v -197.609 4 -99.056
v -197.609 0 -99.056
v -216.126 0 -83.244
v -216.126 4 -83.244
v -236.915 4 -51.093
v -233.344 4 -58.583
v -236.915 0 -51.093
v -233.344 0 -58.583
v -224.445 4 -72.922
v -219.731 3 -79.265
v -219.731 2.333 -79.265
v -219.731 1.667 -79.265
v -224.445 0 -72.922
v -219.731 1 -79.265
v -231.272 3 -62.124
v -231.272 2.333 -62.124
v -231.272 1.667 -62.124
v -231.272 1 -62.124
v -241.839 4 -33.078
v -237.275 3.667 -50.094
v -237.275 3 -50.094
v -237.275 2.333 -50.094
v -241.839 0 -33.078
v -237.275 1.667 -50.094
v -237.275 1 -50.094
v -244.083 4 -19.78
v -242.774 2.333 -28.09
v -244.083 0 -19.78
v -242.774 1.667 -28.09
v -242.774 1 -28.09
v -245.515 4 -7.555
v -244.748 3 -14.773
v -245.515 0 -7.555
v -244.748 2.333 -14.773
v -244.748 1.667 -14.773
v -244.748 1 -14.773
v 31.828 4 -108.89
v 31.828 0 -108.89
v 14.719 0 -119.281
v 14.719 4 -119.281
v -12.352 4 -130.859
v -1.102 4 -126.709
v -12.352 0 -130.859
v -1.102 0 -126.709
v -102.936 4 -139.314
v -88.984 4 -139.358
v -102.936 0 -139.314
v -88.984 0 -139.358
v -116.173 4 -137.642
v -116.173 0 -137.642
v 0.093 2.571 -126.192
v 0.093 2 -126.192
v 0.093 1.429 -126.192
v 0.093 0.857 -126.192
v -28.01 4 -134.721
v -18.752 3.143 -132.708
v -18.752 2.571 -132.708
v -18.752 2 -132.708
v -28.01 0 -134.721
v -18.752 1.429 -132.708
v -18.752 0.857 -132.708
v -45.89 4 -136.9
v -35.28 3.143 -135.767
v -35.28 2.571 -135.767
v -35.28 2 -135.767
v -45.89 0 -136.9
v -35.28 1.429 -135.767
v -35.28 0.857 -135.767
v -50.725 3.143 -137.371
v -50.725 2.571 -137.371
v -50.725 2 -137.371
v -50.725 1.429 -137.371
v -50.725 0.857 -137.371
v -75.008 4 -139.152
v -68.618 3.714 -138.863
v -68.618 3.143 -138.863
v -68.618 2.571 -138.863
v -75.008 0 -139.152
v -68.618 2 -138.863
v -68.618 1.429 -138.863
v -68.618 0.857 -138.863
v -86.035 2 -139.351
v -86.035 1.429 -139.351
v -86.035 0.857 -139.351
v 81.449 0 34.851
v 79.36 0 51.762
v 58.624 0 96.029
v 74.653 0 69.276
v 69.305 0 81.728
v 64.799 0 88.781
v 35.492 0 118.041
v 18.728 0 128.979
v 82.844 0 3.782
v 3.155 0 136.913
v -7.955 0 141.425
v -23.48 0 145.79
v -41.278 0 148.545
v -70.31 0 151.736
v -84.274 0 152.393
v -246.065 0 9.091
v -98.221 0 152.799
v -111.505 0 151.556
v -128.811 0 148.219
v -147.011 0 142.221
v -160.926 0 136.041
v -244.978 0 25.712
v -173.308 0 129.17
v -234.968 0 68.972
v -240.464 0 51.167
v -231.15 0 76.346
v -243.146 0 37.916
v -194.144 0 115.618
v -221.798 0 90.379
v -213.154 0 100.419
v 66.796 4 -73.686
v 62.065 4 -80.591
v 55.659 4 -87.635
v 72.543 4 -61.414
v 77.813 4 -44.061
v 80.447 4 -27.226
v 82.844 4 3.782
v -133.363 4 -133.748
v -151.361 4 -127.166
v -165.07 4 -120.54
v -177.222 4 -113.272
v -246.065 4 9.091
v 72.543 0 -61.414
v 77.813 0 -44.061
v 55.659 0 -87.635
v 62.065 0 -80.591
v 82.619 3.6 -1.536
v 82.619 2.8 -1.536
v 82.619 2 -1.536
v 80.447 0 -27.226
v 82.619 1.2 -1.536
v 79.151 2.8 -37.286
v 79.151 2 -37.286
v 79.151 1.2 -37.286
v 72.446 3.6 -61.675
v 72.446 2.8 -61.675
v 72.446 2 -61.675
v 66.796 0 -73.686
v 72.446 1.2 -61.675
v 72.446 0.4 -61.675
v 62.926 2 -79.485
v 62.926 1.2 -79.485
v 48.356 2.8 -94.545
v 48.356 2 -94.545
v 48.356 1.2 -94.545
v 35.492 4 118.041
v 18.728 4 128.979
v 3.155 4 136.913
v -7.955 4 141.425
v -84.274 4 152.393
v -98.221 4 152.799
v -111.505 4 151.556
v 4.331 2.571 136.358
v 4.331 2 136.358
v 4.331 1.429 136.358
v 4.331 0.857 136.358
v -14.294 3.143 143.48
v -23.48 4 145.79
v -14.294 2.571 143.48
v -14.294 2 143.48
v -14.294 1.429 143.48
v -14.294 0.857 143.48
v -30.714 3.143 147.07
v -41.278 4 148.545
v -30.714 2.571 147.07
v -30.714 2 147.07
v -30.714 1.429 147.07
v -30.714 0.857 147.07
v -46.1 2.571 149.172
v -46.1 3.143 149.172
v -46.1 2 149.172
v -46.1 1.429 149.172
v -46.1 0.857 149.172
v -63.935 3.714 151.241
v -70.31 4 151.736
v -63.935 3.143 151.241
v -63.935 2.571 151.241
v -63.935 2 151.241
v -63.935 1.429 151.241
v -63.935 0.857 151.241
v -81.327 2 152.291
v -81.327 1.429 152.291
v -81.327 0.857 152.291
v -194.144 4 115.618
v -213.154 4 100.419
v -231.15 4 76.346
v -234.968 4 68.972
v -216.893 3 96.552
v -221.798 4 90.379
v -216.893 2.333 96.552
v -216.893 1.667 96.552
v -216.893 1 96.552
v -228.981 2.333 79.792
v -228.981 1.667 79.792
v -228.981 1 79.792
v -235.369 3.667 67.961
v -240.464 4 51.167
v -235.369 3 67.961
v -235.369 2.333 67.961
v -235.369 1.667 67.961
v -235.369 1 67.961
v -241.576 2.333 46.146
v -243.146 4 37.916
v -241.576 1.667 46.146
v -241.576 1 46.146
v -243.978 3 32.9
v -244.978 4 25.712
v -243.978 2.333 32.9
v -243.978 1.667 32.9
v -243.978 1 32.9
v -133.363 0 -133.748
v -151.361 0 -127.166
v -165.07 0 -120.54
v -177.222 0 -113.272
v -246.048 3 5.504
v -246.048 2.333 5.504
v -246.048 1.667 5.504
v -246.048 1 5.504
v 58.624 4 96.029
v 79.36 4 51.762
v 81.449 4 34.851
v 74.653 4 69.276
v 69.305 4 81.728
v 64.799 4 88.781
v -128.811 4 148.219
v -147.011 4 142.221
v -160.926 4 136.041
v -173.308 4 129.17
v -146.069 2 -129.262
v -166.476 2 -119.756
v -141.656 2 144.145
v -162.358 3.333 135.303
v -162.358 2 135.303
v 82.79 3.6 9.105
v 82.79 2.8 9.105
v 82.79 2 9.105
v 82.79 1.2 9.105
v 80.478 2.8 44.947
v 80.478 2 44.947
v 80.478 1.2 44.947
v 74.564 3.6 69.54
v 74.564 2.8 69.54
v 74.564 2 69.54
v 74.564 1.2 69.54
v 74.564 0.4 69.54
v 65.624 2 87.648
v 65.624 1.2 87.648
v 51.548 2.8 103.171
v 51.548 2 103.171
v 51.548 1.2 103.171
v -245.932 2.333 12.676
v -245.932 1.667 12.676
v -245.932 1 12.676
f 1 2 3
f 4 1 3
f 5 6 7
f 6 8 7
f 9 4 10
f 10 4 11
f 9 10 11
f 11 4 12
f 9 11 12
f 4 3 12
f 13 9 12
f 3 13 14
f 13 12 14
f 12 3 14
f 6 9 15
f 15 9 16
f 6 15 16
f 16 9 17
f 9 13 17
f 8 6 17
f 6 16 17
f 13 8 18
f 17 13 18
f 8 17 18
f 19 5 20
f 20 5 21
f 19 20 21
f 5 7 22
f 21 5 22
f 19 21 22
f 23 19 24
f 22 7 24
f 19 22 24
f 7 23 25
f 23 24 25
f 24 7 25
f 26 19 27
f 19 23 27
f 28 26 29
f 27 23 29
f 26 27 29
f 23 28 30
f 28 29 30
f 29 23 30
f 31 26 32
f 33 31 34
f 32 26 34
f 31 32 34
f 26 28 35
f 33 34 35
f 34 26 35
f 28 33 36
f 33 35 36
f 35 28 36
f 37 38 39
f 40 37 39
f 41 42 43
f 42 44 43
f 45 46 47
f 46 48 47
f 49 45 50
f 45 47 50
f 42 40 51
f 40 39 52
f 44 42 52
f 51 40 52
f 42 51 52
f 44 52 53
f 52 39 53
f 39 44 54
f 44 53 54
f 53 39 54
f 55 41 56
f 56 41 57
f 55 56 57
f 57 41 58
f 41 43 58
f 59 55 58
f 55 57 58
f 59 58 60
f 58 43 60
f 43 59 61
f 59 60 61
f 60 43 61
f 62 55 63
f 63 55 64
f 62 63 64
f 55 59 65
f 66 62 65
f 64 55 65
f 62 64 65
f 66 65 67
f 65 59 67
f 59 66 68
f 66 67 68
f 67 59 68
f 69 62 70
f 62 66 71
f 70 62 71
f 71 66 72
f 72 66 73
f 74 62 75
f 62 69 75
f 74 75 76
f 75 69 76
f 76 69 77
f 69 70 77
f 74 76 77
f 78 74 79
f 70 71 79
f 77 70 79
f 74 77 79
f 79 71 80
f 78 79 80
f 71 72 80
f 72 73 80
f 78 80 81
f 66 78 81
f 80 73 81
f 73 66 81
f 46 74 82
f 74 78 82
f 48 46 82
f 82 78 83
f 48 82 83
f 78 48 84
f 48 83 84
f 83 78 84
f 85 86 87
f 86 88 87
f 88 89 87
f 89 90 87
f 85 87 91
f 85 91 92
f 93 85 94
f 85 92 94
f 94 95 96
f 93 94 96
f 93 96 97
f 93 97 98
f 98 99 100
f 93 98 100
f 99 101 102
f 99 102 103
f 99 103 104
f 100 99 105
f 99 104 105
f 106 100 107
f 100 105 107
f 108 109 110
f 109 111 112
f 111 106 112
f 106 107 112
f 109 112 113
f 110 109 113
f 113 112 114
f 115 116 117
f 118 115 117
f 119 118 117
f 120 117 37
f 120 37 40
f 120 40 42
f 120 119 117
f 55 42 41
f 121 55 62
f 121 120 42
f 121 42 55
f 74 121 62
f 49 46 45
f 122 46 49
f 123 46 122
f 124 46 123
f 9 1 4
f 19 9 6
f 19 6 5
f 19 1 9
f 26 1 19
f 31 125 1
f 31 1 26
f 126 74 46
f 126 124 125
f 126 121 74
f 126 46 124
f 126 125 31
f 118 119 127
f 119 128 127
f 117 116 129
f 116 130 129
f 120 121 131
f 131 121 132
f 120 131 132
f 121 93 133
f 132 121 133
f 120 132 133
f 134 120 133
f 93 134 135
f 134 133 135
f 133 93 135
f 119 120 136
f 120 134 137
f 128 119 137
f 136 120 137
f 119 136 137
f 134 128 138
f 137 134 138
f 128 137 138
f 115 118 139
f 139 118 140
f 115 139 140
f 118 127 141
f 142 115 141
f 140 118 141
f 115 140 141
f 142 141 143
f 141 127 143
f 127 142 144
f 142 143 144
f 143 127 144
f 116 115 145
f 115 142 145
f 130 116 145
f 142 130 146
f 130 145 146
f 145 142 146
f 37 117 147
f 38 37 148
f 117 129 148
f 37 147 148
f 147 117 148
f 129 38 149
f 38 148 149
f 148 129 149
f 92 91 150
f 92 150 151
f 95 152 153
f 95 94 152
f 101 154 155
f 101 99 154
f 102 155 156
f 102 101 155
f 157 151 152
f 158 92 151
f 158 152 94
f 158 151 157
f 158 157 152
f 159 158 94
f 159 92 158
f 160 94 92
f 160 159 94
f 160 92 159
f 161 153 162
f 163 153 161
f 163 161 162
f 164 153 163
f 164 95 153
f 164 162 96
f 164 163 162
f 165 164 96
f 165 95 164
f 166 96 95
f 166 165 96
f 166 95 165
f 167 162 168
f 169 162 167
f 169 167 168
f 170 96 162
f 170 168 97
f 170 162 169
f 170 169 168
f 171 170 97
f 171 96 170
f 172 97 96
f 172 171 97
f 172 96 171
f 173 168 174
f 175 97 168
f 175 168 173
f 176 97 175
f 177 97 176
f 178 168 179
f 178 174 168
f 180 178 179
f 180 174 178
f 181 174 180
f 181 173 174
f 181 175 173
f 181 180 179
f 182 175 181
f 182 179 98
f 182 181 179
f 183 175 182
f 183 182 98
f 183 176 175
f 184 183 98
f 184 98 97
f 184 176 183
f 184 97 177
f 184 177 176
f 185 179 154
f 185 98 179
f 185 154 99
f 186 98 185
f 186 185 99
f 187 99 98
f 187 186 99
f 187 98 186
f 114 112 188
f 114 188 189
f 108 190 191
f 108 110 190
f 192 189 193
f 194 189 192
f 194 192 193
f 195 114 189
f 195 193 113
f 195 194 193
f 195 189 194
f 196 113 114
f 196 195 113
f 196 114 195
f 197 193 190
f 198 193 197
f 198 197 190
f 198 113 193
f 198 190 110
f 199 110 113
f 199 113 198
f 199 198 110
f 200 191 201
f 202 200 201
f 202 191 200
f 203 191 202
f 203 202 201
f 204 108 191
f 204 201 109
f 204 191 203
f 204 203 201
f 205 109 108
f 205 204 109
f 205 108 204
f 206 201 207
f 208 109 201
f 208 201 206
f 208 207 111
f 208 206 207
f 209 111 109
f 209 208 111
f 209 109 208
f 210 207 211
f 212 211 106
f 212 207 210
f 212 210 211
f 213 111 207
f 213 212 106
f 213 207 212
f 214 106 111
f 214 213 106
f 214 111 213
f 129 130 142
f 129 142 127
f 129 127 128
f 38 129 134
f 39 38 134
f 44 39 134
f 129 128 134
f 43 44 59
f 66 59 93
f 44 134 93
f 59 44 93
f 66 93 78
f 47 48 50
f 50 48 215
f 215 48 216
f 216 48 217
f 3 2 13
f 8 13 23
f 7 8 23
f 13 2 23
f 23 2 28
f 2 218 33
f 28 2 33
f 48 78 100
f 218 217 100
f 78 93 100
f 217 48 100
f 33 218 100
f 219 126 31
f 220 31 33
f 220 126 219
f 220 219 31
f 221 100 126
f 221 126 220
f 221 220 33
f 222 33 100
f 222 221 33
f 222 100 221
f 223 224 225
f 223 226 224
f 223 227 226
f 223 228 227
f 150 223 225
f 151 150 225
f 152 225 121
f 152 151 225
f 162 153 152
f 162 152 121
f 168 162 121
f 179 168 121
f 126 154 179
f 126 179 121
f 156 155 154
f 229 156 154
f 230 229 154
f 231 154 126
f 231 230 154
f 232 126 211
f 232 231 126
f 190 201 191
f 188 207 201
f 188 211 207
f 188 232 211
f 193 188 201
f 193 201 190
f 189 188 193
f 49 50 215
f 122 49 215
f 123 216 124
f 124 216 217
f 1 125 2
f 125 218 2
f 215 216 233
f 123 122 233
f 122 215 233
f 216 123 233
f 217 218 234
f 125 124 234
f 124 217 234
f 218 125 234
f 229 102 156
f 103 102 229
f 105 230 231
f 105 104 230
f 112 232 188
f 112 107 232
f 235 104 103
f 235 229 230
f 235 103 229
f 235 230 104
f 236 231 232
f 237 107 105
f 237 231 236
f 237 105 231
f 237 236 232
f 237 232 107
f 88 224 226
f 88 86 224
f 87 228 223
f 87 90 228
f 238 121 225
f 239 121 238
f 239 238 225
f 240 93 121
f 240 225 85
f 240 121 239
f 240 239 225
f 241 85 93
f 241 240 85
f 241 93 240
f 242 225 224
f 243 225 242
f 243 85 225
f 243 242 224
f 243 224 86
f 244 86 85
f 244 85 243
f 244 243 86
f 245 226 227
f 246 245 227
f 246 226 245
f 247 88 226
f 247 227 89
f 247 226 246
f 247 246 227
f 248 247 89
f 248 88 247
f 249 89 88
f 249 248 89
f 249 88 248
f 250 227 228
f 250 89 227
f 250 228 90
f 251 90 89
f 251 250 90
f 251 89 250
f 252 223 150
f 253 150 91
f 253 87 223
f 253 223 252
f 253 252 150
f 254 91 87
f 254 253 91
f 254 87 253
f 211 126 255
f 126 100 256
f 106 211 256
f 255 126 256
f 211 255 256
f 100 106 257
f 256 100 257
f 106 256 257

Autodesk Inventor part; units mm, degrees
ref_plane "YZ Plane" through (0, 0, 0) normal (1, 0, 0) x (0, 1, 0)
ref_plane "XZ Plane" through (0, 0, 0) normal (0, 1, 0) x (-1, 0, 0)
ref_plane "XY Plane" through (0, 0, 0) normal (0, 0, 1) x (1, 0, 0)
sketch "Эскиз1" plane through (0, 0, 0) normal (0, 1, 0) x (-1, 0, 0)
  line L0 (-81.3316, -22.101) -> (-82.4097, -10.5497) construction
  line L1 (-82.4097, -10.5497) -> (-83.3338, 3.774) construction
  line L2 (-83.3338, 3.774) -> (-82.2557, 21.486) construction
  line L3 (-82.2557, 21.486) -> (-81.3316, 38.8901) construction
  line L4 (-81.3316, 38.8901) -> (-79.8522, 51.3377) construction
  line L5 (-79.8522, 51.3377) -> (-76.1961, 64.7434) construction
  line L6 (-76.1961, 64.7434) -> (-73.0275, 74.6555) construction
  line L7 (-73.0275, 74.6555) -> (-68.2339, 84.2426) construction
  line L8 (-68.2339, 84.2426) -> (-63.1966, 91.2298) construction
  line L9 (-63.1966, 91.2298) -> (-56.2094, 98.7045) construction
  line L10 (-56.2094, 98.7045) -> (-49.8722, 104.8792) construction
  line L11 (-49.8722, 104.8792) -> (-42.6413, 111.5415) construction
  line L12 (-42.6413, 111.5415) -> (-35.4916, 118.0412) construction
  spline S0 degree 4 poles (-81.3316, -22.101) (-82.4097, -10.5497) (-83.3338, 3.774) (-82.2557, 21.486) (-81.3316, 38.8901) (-79.8522, 51.3377) (-76.1961, 64.7434) (-73.0275, 74.6555) (-68.2339, 84.2426) (-63.1966, 91.2298) (-56.2094, 98.7045) (-49.8722, 104.8792) (-42.6413, 111.5415) (-35.4916, 118.0412) knots 1 1 1 1 1 2 3 4 5 6 7 8 9 10 11 11 11 11 11
  line L13 (-35.4916, 118.0412) -> (-26.9213, 124.335) construction
  line L14 (-26.9213, 124.335) -> (-18.4284, 129.3436) construction
  line L15 (-18.4284, 129.3436) -> (-8.1934, 134.4974) construction
  line L16 (-8.1934, 134.4974) -> (-0.1361, 138.4897) construction
  line L17 (-0.1361, 138.4897) -> (9.5182, 142.1192) construction
  line L18 (9.5182, 142.1192) -> (19.245, 145.0227) construction
  line L19 (19.245, 145.0227) -> (26.7942, 146.4745) construction
  line L20 (26.7942, 146.4745) -> (34.6338, 147.7085) construction
  line L21 (34.6338, 147.7085) -> (42.183, 148.6521) construction
  line L22 (42.183, 148.6521) -> (49.8774, 149.6684) construction
  line L23 (49.8774, 149.6684) -> (59.0962, 150.9024) construction
  line L24 (59.0962, 150.9024) -> (68.823, 151.6283) construction
  line L25 (68.823, 151.6283) -> (77.4611, 152.2815) construction
  line L26 (77.4611, 152.2815) -> (85.0103, 152.2815) construction
  line L27 (85.0103, 152.2815) -> (93.1402, 152.9348) construction
  line L28 (93.1402, 152.9348) -> (101.4153, 152.9348) construction
  line L29 (101.4153, 152.9348) -> (111.5051, 151.5557) construction
  spline S1 degree 4 poles (-35.4916, 118.0412) (-26.9213, 124.335) (-18.4284, 129.3436) (-8.1934, 134.4974) (-0.1361, 138.4897) (9.5182, 142.1192) (19.245, 145.0227) (26.7942, 146.4745) (34.6338, 147.7085) (42.183, 148.6521) (49.8774, 149.6684) (59.0962, 150.9024) (68.823, 151.6283) (77.4611, 152.2815) (85.0103, 152.2815) (93.1402, 152.9348) (101.4153, 152.9348) (111.5051, 151.5557) knots 1 1 1 1 1 2 3 4 5 6 7 8 9 10 11 12 13 14 15 15 15 15 15
  line L30 (111.5051, 151.5557) -> (120.4722, 150.4408) construction
  line L31 (120.4722, 150.4408) -> (127.0223, 148.8843) construction
  line L32 (127.0223, 148.8843) -> (136.88, 145.7713) construction
  line L33 (136.88, 145.7713) -> (146.6728, 142.5287) construction
  line L34 (146.6728, 142.5287) -> (156.9196, 138.2484) construction
  line L35 (156.9196, 138.2484) -> (167.6204, 132.6061) construction
  line L36 (167.6204, 132.6061) -> (176.8944, 127.1585) construction
  line L37 (176.8944, 127.1585) -> (185.5199, 121.4514) construction
  line L38 (185.5199, 121.4514) -> (194.1438, 115.6177) construction
  spline S2 degree 4 poles (111.5051, 151.5557) (120.4722, 150.4408) (127.0223, 148.8843) (136.88, 145.7713) (146.6728, 142.5287) (156.9196, 138.2484) (167.6204, 132.6061) (176.8944, 127.1585) (185.5199, 121.4514) (194.1438, 115.6177) knots 1 1 1 1 1 2 3 4 5 6 7 7 7 7 7
  line L39 (194.1438, 115.6177) -> (200.24, 111.078) construction
  line L40 (200.24, 111.078) -> (206.9199, 106.0194) construction
  line L41 (206.9199, 106.0194) -> (214.1834, 99.9232) construction
  line L42 (214.1834, 99.9232) -> (219.8905, 93.2434) construction
  line L43 (219.8905, 93.2434) -> (226.1164, 84.3585) construction
  line L44 (226.1164, 84.3585) -> (232.2126, 74.7602) construction
  line L45 (232.2126, 74.7602) -> (234.0285, 71.4527) construction
  line L46 (234.0285, 71.4527) -> (236.5578, 65.162) construction
  line L47 (236.5578, 65.162) -> (240.1895, 53.5532) construction
  line L48 (240.1895, 53.5532) -> (243.1079, 38.7667) construction
  line L49 (243.1079, 38.7667) -> (244.9887, 26.8338) construction
  line L50 (244.9887, 26.8338) -> (246.2209, 14.4468) construction
  line L51 (246.2209, 14.4468) -> (246.2209, 2.9029) construction
  line L52 (246.2209, 2.9029) -> (245.2481, -13.7643) construction
  line L53 (245.2481, -13.7643) -> (243.7565, -27.3835) construction
  spline S3 degree 4 poles (194.1438, 115.6177) (200.24, 111.078) (206.9199, 106.0194) (214.1834, 99.9232) (219.8905, 93.2434) (226.1164, 84.3585) (232.2126, 74.7602) (234.0285, 71.4527) (236.5578, 65.162) (240.1895, 53.5532) (243.1079, 38.7667) (244.9887, 26.8338) (246.2209, 14.4468) (246.2209, 2.9029) (245.2481, -13.7643) (243.7565, -27.3835) knots 1 1 1 1 1 2 3 4 5 6 7 8 9 10 11 12 13 13 13 13 13
  line L54 (-83.3338, 3.774) -> (246.0649, 9.0912)
  line L55 (-82.1678, 29.7001) -> (-82.8725, 18.12) construction
  line L56 (-82.8725, 18.12) -> (-83.3338, 3.774) construction
  line L57 (-83.3338, 3.774) -> (-81.6846, -13.8941) construction
  line L58 (-81.6846, -13.8941) -> (-80.1992, -31.2592) construction
  line L59 (-80.1992, -31.2592) -> (-78.3188, -43.6526) construction
  line L60 (-78.3188, -43.6526) -> (-74.232, -56.9333) construction
  line L61 (-74.232, -56.9333) -> (-70.7451, -66.738) construction
  line L62 (-70.7451, -66.738) -> (-65.6446, -76.1654) construction
  line L63 (-65.6446, -76.1654) -> (-60.3844, -82.9864) construction
  line L64 (-60.3844, -82.9864) -> (-53.1596, -90.2316) construction
  line L65 (-53.1596, -90.2316) -> (-46.6263, -96.1986) construction
  line L66 (-46.6263, -96.1986) -> (-39.1841, -102.624) construction
  line L67 (-39.1841, -102.624) -> (-31.8284, -108.8896) construction
  spline S4 degree 4 poles (-82.1678, 29.7001) (-82.8725, 18.12) (-83.3338, 3.774) (-81.6846, -13.8941) (-80.1992, -31.2592) (-78.3188, -43.6526) (-74.232, -56.9333) (-70.7451, -66.738) (-65.6446, -76.1654) (-60.3844, -82.9864) (-53.1596, -90.2316) (-46.6263, -96.1986) (-39.1841, -102.624) (-31.8284, -108.8896) knots 1 1 1 1 1 2 3 4 5 6 7 8 9 10 11 11 11 11 11
  line L68 (-31.8284, -108.8896) -> (-23.0594, -114.9034) construction
  line L69 (-23.0594, -114.9034) -> (-14.4093, -119.6353) construction
  line L70 (-14.4093, -119.6353) -> (-4.0133, -124.4561) construction
  line L71 (-4.0133, -124.4561) -> (4.1687, -128.1863) construction
  line L72 (4.1687, -128.1863) -> (13.9351, -131.5022) construction
  line L73 (13.9351, -131.5022) -> (23.7506, -134.0903) construction
  line L74 (23.7506, -134.0903) -> (31.3427, -135.2977) construction
  line L75 (31.3427, -135.2977) -> (39.218, -136.278) construction
  line L76 (39.218, -136.278) -> (46.7937, -136.9775) construction
  line L77 (46.7937, -136.9775) -> (54.5169, -137.7449) construction
  line L78 (54.5169, -137.7449) -> (63.7707, -138.6807) construction
  line L79 (63.7707, -138.6807) -> (73.5159, -139.0922) construction
  line L80 (73.5159, -139.0922) -> (82.1705, -139.4664) construction
  line L81 (82.1705, -139.4664) -> (89.7158, -139.2227) construction
  line L82 (89.7158, -139.2227) -> (97.8626, -139.6133) construction
  line L83 (97.8626, -139.6133) -> (106.1334, -139.3462) construction
  line L84 (106.1334, -139.3462) -> (116.1734, -137.6421) construction
  spline S5 degree 4 poles (-31.8284, -108.8896) (-23.0594, -114.9034) (-14.4093, -119.6353) (-4.0133, -124.4561) (4.1687, -128.1863) (13.9351, -131.5022) (23.7506, -134.0903) (31.3427, -135.2977) (39.218, -136.278) (46.7937, -136.9775) (54.5169, -137.7449) (63.7707, -138.6807) (73.5159, -139.0922) (82.1705, -139.4664) (89.7158, -139.2227) (97.8626, -139.6133) (106.1334, -139.3462) (116.1734, -137.6421) knots 1 1 1 1 1 2 3 4 5 6 7 8 9 10 11 12 13 14 15 15 15 15 15
  line L85 (116.1734, -137.6421) -> (125.0998, -136.2383) construction
  line L86 (125.0998, -136.2383) -> (131.5963, -134.4712) construction
  line L87 (131.5963, -134.4712) -> (141.3484, -131.0417) construction
  line L88 (141.3484, -131.0417) -> (151.0315, -127.4847) construction
  line L89 (151.0315, -127.4847) -> (161.1348, -122.8759) construction
  line L90 (161.1348, -122.8759) -> (171.6479, -116.8912) construction
  line L91 (171.6479, -116.8912) -> (180.7412, -111.1471) construction
  line L92 (180.7412, -111.1471) -> (189.178, -105.1646) construction
  line L93 (189.178, -105.1646) -> (197.6091, -99.0555) construction
  spline S6 degree 4 poles (116.1734, -137.6421) (125.0998, -136.2383) (131.5963, -134.4712) (141.3484, -131.0417) (151.0315, -127.4847) (161.1348, -122.8759) (171.6479, -116.8912) (180.7412, -111.1471) (189.178, -105.1646) (197.6091, -99.0555) knots 1 1 1 1 1 2 3 4 5 6 7 7 7 7 7
  line L94 (197.6091, -99.0555) -> (203.5556, -94.3214) construction
  line L95 (203.5556, -94.3214) -> (210.0688, -89.0499) construction
  line L96 (210.0688, -89.0499) -> (217.1318, -82.7225) construction
  line L97 (217.1318, -82.7225) -> (222.6203, -75.8619) construction
  line L98 (222.6203, -75.8619) -> (228.5561, -66.7807) construction
  line L99 (228.5561, -66.7807) -> (234.3394, -56.9906) construction
  line L100 (234.3394, -56.9906) -> (236.0476, -53.6262) construction
  line L101 (236.0476, -53.6262) -> (238.3725, -47.2571) construction
  line L102 (238.3725, -47.2571) -> (241.6277, -35.5373) construction
  line L103 (241.6277, -35.5373) -> (244.0673, -20.6643) construction
  line L104 (244.0673, -20.6643) -> (245.5619, -8.6768) construction
  line L105 (245.5619, -8.6768) -> (246.3937, 3.7435) construction
  line L106 (246.3937, 3.7435) -> (246.0211, 15.2813) construction
  line L107 (246.0211, 15.2813) -> (244.5108, 31.9085) construction
  line L108 (244.5108, 31.9085) -> (242.5804, 45.4724) construction
  spline S7 degree 4 poles (197.6091, -99.0555) (203.5556, -94.3214) (210.0688, -89.0499) (217.1318, -82.7225) (222.6203, -75.8619) (228.5561, -66.7807) (234.3394, -56.9906) (236.0476, -53.6262) (238.3725, -47.2571) (241.6277, -35.5373) (244.0673, -20.6643) (245.5619, -8.6768) (246.3937, 3.7435) (246.0211, 15.2813) (244.5108, 31.9085) (242.5804, 45.4724) knots 1 1 1 1 1 2 3 4 5 6 7 8 9 10 11 12 13 13 13 13 13
  point P0 (0, 0)
  point P1 (245.5153, -7.5556)
  point P2 (246.0649, 9.0912)
  point P3 (244.9783, 25.7116)
  point P4 (-82.8445, 3.7819)
extrude "Выдавливание1" add sketch "Эскиз1" along normal blind 4 contours S0 S1 S2 S3 S7 L54 | L54 S3 S7 S6 S5 S4
properties part number "head_1"
